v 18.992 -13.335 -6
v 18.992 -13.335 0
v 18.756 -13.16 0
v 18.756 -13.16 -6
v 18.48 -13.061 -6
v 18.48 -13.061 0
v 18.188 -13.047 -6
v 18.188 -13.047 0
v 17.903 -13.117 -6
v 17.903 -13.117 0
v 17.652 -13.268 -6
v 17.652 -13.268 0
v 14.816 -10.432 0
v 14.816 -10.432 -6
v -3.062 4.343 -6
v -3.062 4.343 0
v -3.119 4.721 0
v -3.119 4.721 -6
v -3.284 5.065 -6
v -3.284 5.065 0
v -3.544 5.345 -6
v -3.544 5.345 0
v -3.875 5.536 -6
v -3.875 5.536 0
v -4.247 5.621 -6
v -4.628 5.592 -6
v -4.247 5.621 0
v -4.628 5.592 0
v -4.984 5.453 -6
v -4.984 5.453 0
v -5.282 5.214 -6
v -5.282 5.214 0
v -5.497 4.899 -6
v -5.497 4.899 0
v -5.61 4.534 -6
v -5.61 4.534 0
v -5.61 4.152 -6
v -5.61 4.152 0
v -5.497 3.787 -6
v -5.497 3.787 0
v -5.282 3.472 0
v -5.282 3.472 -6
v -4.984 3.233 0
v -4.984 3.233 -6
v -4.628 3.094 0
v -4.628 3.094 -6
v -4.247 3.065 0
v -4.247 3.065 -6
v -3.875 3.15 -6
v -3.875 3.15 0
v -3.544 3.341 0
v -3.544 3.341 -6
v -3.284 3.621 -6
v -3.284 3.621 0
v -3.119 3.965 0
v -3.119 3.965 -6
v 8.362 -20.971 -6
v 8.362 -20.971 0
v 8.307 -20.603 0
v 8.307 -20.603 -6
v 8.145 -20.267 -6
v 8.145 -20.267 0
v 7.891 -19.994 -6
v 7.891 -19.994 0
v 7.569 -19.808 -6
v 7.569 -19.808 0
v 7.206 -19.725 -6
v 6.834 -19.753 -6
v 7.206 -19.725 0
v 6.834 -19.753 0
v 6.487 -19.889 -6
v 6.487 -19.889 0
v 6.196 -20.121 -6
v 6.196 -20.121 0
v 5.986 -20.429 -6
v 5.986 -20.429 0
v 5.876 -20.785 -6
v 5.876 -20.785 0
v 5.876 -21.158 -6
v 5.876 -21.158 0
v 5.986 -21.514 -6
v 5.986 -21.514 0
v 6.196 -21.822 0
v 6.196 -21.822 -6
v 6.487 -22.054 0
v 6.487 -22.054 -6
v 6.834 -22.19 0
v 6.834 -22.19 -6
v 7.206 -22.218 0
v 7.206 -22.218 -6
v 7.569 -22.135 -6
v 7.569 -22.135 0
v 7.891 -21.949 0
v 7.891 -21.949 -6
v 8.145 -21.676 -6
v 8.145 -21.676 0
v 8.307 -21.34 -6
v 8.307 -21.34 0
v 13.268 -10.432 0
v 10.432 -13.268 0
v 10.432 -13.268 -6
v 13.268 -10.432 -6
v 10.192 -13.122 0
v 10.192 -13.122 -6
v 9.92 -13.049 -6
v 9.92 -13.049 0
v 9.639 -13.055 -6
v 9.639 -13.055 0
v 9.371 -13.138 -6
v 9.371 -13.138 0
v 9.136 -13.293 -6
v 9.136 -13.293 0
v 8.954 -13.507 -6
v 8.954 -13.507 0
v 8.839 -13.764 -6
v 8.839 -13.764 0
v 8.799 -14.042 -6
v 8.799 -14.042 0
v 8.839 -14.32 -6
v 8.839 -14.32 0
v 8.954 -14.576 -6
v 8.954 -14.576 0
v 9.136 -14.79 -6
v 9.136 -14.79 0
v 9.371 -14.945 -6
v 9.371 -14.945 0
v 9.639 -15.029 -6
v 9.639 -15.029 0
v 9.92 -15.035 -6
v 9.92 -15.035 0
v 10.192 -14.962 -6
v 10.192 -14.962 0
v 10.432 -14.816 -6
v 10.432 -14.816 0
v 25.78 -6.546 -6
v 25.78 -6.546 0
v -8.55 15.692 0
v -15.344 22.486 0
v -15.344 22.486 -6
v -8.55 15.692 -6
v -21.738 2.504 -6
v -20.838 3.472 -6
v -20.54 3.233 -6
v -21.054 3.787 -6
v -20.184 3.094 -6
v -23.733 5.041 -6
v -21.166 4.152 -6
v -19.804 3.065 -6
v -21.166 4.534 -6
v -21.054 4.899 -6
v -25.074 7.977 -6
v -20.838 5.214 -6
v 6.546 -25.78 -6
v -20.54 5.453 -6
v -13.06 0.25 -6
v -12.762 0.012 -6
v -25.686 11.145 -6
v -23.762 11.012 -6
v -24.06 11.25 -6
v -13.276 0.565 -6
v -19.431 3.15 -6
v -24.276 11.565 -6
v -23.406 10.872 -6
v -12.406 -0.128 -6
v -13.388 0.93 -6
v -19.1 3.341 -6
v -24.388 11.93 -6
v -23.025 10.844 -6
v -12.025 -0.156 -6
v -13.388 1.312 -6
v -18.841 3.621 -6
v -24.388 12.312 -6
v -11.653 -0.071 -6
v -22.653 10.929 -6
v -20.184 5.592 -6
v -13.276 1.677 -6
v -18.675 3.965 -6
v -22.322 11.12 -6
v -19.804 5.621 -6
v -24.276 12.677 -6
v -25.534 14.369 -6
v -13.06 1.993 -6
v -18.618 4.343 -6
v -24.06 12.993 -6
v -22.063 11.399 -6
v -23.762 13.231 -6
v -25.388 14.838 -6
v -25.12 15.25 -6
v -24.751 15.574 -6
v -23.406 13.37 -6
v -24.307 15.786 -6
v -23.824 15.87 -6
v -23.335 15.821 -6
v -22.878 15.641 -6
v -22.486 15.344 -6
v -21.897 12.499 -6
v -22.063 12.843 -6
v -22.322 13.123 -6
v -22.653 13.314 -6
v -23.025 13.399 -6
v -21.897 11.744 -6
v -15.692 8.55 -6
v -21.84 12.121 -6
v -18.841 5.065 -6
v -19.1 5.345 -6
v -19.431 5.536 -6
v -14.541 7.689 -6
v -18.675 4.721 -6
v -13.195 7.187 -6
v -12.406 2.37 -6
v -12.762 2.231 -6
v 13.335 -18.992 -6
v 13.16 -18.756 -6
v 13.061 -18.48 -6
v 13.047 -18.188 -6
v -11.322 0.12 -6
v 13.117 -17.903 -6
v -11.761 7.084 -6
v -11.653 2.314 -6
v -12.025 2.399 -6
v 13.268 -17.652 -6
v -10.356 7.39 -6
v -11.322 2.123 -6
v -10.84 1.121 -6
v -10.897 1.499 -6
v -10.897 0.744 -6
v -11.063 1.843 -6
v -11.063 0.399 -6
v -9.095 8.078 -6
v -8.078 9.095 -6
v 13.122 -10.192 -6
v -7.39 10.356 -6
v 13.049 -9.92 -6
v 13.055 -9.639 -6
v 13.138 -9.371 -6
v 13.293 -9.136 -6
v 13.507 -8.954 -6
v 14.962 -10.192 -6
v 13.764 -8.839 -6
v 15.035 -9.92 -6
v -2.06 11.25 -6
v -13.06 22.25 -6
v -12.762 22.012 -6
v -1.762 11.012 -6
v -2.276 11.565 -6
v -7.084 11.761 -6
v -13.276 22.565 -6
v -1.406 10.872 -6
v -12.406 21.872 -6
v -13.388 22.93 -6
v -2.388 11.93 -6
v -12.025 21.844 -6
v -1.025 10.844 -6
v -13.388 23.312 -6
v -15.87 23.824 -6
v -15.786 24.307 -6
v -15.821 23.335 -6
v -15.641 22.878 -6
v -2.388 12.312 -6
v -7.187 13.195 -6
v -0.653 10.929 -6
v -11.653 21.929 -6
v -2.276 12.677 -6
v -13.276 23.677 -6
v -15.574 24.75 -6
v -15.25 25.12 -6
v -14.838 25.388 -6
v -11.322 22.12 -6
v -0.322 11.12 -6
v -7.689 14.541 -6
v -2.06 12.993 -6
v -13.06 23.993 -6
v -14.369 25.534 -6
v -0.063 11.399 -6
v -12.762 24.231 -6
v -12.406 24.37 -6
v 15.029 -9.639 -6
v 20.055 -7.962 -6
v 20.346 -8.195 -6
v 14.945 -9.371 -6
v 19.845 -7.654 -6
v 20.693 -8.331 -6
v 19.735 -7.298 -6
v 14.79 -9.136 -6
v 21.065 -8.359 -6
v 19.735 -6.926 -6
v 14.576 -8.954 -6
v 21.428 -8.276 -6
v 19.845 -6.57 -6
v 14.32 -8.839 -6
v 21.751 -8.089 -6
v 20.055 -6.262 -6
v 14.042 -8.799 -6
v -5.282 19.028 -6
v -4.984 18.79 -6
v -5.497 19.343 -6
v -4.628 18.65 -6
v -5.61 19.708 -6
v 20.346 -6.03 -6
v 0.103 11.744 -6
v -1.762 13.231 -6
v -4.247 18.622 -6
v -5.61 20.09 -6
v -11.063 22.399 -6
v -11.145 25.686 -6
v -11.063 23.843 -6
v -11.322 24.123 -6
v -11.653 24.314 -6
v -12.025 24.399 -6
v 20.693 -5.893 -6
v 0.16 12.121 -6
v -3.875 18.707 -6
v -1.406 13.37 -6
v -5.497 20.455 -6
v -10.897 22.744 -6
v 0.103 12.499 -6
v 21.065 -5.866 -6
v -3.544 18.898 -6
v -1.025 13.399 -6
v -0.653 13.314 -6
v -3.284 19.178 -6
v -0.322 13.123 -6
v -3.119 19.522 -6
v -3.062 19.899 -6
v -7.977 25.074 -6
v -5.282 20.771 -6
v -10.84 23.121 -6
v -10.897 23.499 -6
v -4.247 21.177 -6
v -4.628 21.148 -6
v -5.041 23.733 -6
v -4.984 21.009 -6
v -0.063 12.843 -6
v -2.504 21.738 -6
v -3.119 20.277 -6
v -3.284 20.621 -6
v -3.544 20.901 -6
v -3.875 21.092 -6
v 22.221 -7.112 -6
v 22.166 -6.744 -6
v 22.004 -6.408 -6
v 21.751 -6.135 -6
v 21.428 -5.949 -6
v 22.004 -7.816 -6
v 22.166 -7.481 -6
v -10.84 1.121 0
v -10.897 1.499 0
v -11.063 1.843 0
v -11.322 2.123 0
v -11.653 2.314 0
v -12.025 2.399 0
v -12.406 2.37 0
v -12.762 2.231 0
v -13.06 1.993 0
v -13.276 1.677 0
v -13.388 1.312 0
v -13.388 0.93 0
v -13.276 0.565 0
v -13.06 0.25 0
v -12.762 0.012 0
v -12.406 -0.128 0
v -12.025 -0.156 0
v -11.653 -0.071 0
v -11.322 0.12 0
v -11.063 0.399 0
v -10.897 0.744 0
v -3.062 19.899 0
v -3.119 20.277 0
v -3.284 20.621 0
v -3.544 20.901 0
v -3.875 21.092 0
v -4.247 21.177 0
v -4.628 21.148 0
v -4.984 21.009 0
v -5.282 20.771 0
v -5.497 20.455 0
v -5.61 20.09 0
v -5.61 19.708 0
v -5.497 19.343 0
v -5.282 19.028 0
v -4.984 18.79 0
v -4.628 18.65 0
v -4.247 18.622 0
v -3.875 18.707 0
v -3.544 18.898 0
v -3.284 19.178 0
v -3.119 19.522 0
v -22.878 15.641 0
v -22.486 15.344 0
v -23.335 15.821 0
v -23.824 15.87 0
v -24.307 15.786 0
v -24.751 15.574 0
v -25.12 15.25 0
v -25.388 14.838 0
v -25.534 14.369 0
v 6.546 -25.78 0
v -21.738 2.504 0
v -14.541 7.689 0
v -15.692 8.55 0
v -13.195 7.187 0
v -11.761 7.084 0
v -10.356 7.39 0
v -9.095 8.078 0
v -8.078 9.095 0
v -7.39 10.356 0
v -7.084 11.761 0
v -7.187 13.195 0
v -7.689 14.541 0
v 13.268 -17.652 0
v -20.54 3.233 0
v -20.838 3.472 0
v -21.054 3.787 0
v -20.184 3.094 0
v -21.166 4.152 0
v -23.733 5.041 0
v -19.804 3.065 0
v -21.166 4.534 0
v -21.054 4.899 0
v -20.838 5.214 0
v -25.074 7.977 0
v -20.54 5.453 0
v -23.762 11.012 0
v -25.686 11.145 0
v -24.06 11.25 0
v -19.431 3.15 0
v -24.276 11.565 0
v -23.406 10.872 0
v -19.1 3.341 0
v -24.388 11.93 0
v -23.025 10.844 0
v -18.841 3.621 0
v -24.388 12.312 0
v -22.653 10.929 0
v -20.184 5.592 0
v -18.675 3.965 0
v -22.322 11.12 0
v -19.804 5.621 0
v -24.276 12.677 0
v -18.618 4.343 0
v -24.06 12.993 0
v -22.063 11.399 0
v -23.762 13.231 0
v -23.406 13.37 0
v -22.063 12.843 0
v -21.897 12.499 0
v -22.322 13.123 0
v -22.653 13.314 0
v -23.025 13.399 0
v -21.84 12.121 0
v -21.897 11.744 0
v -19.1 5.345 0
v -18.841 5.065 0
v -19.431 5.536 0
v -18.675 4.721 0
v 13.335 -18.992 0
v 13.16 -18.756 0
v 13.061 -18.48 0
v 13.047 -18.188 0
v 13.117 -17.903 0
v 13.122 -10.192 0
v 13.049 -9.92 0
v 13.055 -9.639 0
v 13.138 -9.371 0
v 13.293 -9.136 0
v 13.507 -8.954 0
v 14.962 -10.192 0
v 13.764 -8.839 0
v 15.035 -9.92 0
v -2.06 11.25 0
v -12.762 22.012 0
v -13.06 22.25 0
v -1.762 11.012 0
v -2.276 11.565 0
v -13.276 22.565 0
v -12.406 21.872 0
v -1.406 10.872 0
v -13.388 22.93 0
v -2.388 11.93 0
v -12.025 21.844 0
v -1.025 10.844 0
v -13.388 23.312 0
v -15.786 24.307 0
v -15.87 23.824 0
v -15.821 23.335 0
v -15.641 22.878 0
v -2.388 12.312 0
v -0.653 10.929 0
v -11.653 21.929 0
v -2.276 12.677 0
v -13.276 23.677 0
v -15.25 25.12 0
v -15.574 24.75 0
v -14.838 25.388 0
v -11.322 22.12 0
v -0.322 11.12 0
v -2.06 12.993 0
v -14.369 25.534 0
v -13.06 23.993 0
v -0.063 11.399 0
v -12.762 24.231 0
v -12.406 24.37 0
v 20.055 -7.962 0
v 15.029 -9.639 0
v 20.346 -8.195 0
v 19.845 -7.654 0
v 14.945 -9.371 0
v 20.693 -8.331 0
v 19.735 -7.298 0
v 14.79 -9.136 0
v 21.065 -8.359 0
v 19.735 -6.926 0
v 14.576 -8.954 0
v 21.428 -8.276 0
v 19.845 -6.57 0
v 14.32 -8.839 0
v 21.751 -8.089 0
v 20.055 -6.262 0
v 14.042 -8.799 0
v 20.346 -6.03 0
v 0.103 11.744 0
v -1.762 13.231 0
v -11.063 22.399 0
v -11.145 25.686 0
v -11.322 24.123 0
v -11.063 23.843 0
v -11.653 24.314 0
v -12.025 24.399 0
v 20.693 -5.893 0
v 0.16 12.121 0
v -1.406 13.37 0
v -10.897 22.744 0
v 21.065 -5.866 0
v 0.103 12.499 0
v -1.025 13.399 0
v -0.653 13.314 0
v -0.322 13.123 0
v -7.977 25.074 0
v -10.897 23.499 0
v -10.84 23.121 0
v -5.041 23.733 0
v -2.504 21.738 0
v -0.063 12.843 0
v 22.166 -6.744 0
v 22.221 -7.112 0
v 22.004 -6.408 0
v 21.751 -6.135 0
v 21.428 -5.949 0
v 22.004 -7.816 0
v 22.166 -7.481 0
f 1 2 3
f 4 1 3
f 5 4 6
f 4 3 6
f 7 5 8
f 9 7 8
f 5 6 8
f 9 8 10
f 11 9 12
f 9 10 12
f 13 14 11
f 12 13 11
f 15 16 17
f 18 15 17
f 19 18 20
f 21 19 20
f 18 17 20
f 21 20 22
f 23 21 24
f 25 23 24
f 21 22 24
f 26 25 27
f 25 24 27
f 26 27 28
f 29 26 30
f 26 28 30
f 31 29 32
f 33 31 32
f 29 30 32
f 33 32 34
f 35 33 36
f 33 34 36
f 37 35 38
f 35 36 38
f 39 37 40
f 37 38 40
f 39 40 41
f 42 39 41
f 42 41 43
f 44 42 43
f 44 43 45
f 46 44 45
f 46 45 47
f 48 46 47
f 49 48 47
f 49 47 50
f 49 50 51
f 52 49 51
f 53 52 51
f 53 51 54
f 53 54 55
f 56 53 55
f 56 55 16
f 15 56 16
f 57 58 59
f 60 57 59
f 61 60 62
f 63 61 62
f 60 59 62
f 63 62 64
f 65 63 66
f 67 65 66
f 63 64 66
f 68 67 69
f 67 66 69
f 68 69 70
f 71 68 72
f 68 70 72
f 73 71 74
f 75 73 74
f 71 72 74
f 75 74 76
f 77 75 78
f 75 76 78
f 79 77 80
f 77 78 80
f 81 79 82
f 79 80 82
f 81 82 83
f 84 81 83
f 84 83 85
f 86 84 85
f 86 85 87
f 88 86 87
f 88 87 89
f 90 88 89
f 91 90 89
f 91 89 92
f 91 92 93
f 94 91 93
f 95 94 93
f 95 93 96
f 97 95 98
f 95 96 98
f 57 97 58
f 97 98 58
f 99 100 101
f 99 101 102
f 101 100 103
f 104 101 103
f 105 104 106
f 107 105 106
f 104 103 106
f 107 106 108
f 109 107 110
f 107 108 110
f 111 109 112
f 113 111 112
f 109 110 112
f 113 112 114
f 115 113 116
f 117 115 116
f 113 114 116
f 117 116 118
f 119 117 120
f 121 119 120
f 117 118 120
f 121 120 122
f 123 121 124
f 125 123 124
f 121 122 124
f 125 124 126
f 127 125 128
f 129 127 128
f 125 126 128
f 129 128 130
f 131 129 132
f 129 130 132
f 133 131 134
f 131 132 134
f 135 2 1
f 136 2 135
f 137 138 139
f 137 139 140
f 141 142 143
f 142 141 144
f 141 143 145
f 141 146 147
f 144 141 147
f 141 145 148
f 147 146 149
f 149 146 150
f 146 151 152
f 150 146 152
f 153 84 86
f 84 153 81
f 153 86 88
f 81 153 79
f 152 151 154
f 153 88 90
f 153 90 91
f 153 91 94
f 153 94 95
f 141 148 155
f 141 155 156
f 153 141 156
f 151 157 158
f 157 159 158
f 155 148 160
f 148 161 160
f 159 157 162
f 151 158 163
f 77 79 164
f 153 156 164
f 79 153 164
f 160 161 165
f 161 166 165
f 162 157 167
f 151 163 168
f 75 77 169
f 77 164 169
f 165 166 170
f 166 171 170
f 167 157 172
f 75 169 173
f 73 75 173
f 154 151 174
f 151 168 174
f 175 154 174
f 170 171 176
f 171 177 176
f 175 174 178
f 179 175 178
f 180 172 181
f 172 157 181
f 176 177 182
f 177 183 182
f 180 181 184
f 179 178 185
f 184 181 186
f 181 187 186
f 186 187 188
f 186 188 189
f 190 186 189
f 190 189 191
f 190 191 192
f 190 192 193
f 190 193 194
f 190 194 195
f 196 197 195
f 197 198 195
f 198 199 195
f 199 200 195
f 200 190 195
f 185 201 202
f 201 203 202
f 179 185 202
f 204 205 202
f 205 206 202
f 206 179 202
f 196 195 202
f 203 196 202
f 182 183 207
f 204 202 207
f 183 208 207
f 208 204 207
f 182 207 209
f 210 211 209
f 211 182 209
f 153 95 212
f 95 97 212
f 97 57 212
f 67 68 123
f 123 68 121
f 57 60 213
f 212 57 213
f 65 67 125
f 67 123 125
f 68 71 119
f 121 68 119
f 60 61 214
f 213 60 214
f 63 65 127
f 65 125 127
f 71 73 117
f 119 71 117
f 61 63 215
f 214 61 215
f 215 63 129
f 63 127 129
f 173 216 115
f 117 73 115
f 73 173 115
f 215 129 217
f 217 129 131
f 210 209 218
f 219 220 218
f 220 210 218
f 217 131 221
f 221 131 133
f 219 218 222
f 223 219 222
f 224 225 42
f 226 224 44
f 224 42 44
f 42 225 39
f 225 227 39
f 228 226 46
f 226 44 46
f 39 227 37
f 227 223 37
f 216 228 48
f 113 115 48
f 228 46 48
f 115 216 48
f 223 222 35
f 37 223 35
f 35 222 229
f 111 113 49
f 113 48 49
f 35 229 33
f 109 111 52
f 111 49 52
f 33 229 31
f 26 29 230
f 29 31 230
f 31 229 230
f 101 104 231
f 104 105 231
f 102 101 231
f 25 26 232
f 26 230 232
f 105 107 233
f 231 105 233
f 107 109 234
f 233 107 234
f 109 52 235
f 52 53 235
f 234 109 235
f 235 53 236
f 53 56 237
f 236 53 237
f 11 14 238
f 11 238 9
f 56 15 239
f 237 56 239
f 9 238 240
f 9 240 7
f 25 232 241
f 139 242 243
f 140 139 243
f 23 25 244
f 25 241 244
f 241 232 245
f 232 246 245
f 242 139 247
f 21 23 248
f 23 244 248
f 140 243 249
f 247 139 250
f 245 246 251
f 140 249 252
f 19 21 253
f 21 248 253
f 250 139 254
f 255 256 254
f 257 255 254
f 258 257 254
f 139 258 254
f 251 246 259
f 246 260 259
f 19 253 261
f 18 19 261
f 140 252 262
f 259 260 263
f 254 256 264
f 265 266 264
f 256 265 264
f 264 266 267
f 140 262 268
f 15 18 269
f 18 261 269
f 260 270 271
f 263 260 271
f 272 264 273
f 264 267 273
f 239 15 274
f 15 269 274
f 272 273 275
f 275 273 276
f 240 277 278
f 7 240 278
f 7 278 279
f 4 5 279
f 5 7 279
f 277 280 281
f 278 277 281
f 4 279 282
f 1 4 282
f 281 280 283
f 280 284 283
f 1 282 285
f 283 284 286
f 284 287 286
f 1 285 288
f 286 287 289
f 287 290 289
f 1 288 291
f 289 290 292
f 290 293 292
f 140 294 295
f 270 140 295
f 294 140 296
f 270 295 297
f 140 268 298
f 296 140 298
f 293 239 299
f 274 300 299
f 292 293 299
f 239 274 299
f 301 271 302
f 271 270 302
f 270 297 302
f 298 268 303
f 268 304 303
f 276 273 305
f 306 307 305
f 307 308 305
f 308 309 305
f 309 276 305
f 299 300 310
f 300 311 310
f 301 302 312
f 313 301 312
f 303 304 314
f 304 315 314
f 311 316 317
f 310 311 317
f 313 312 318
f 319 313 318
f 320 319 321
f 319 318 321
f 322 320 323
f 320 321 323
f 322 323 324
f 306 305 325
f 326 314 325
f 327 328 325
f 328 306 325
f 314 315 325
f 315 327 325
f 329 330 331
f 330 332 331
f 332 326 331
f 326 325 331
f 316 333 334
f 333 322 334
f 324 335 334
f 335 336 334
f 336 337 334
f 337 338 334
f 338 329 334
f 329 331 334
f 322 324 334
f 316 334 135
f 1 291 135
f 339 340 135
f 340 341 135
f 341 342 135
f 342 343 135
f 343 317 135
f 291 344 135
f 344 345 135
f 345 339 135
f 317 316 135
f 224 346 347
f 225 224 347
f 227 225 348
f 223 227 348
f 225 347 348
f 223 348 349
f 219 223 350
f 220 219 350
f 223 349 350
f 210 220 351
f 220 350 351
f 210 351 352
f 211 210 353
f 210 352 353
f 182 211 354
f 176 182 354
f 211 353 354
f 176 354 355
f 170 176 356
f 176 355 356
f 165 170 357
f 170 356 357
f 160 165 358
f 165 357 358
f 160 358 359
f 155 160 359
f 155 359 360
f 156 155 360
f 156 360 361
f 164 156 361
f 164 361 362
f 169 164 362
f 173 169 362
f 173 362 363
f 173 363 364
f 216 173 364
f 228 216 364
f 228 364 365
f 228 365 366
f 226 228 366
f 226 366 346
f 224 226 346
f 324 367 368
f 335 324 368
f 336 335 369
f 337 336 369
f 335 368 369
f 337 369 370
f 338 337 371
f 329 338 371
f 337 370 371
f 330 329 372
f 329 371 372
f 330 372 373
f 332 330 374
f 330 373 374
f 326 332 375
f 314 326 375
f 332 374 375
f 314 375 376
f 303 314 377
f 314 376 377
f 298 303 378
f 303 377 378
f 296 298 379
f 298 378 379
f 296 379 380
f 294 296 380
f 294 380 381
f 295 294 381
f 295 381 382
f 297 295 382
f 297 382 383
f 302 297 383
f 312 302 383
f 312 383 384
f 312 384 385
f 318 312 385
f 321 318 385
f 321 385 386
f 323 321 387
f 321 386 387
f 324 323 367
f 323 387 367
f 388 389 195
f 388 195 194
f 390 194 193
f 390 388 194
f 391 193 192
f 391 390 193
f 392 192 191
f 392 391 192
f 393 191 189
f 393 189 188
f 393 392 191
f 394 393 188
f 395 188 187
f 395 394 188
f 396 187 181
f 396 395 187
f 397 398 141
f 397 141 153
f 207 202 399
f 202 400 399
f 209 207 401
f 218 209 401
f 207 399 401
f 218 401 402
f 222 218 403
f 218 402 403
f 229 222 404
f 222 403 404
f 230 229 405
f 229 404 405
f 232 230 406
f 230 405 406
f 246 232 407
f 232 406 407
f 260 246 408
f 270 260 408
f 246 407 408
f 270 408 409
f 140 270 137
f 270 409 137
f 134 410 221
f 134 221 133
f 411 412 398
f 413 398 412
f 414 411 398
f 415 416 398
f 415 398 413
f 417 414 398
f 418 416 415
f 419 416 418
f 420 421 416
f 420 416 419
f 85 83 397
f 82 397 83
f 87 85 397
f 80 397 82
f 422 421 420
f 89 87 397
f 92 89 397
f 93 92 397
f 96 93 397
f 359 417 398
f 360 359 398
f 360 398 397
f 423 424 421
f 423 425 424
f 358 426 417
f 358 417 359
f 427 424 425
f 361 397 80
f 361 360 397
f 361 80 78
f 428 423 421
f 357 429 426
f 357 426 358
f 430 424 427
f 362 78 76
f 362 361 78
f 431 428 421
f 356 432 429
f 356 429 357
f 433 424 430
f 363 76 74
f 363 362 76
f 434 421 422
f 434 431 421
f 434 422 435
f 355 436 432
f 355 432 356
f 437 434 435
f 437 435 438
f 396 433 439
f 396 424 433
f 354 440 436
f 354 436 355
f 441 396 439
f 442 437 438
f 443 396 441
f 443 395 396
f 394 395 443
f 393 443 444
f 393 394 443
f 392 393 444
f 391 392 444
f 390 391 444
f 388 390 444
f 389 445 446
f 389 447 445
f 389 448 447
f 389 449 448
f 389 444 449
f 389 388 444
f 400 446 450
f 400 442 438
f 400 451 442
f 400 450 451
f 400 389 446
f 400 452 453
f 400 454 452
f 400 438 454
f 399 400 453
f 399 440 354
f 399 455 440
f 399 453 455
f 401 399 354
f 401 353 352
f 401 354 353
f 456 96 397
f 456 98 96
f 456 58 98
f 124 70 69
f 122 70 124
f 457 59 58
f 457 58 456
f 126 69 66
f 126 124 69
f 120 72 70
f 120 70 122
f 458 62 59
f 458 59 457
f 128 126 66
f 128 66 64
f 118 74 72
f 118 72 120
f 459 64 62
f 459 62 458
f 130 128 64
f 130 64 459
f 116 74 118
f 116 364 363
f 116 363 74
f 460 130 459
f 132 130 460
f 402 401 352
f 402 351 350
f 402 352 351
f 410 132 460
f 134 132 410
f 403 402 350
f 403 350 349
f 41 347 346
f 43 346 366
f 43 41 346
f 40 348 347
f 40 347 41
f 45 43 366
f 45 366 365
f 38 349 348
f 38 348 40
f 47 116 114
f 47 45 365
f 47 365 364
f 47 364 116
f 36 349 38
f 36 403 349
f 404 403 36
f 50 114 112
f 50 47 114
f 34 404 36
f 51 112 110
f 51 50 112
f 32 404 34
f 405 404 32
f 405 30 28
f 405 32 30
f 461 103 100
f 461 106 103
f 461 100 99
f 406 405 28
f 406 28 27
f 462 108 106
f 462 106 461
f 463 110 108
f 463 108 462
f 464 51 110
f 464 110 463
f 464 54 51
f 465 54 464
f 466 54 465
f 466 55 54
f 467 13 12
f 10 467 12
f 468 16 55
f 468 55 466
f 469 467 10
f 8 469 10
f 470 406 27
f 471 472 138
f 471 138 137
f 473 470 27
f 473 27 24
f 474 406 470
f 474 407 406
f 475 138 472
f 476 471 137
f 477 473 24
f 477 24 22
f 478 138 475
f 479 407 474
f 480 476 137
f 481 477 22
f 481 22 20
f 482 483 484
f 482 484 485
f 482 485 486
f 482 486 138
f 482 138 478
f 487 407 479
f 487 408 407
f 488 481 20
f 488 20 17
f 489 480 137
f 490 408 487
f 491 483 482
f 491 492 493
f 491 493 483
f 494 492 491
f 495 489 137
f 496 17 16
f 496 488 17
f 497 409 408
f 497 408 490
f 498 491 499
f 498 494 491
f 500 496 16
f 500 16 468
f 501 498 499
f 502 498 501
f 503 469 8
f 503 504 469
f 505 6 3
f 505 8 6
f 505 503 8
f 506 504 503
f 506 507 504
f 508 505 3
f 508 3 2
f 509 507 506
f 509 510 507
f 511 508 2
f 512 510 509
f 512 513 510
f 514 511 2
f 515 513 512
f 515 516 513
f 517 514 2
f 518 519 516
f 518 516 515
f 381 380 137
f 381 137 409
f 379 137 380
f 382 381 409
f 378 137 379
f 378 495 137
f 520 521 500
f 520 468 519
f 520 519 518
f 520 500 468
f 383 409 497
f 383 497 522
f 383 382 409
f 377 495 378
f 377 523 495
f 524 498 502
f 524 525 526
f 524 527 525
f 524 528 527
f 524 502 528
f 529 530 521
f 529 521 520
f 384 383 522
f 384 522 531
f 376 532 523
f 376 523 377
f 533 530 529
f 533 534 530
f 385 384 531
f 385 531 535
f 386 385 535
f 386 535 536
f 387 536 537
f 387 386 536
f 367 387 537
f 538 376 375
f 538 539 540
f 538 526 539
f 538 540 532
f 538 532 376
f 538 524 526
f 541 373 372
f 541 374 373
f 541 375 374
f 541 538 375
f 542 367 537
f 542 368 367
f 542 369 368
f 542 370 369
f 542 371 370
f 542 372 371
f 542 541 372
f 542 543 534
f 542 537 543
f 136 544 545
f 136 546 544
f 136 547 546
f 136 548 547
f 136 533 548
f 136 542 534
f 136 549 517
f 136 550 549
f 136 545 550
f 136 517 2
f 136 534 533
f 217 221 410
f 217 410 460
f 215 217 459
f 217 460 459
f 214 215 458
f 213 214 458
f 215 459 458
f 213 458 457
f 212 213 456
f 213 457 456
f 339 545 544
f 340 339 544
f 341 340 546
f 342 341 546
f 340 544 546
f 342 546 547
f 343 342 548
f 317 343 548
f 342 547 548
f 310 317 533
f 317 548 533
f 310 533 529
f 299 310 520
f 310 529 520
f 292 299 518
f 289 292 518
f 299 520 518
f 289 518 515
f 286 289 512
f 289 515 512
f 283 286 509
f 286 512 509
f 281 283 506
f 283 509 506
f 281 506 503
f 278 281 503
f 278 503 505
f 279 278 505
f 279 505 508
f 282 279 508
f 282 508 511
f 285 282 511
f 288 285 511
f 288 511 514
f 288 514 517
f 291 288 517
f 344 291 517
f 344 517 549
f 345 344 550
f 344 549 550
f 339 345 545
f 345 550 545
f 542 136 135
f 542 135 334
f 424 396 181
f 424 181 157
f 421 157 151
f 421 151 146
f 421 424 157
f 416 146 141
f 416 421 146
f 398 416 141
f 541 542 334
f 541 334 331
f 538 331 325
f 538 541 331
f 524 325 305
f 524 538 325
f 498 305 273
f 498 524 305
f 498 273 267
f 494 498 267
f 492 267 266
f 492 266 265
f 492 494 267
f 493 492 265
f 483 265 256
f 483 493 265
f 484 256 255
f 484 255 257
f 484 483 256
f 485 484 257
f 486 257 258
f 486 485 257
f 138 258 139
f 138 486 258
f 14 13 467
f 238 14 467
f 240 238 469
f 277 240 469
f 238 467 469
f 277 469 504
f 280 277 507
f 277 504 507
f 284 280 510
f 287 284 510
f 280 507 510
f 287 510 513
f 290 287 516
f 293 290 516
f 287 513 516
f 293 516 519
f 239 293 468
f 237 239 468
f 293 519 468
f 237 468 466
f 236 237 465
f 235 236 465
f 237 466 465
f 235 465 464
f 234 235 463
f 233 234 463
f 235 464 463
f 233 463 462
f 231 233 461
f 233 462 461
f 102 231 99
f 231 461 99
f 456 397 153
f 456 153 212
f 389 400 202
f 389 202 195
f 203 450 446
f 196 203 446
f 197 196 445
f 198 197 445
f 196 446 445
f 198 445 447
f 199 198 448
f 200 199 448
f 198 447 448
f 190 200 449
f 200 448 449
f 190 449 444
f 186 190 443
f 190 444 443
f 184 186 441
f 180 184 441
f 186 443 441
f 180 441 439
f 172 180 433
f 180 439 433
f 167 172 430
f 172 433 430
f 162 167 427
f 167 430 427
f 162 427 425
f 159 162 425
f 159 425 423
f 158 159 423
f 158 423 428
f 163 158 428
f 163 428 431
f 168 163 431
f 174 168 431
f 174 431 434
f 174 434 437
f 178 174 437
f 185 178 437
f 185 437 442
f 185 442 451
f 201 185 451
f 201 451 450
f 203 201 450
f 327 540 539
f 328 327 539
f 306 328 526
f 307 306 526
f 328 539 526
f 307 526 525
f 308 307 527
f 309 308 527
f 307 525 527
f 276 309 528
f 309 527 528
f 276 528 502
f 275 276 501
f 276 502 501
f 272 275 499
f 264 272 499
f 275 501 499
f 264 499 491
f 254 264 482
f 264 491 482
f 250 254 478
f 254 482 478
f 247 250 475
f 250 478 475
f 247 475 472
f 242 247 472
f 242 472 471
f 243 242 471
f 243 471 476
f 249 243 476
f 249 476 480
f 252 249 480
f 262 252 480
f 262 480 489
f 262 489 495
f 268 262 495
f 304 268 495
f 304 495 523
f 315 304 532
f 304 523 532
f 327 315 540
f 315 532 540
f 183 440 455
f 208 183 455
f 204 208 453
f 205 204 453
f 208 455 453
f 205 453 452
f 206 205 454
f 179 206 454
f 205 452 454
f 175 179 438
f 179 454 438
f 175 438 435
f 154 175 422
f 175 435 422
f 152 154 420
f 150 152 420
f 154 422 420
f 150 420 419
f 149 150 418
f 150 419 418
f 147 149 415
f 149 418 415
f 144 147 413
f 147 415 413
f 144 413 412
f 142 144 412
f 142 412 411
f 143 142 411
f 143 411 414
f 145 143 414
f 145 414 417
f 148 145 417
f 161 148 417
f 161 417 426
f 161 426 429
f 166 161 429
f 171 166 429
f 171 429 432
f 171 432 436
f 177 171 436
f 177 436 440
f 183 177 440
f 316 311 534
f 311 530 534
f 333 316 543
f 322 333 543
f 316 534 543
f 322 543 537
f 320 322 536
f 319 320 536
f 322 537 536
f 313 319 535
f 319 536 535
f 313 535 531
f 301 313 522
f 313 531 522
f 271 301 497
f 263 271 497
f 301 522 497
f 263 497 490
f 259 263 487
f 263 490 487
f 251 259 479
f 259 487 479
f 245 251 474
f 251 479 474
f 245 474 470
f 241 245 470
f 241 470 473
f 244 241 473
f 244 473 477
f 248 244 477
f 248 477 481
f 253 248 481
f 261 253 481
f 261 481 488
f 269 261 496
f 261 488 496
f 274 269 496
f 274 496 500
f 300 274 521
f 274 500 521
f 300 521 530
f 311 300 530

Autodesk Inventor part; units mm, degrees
ref_plane "YZ Plane" through (0, 0, 0) normal (1, 0, 0) x (0, 1, 0)
ref_plane "XZ Plane" through (0, 0, 0) normal (0, 1, 0) x (-1, 0, 0)
ref_plane "XY Plane" through (0, 0, 0) normal (0, 0, 1) x (1, 0, 0)
sketch "스케치1" plane through (0, 0, 0) normal (0, 0, 1) x (1, 0, 0)
  line L0 (25.7798, -6.5464) -> (-2.5045, 21.7378) projected
  arc A0 (-2.5045, 21.7378) -> (-14.369, 25.5341) centre (-12.1212, 12.1212) ccw projected
  arc A1 (-14.369, 25.5341) -> (-15.3443, 22.4861) centre (-14.0715, 23.7589) ccw projected
  line L1 (-15.3443, 22.4861) -> (-8.5503, 15.6921) projected
  arc A2 (-15.6921, 8.5503) -> (-8.5503, 15.6921) centre (-12.1212, 12.1212) ccw projected
  line L2 (-15.6921, 8.5503) -> (-22.4861, 15.3443) projected
  arc A3 (-22.4861, 15.3443) -> (-25.5341, 14.369) centre (-23.7589, 14.0715) ccw projected
  arc A4 (-25.5341, 14.369) -> (-21.7378, 2.5045) centre (-12.1212, 12.1212) ccw projected
  line L3 (-21.7378, 2.5045) -> (6.5464, -25.7798) projected
  line L4 (6.5464, -25.7798) -> (13.3347, -18.9915) projected
  arc A5 (13.2675, -17.6516) -> (13.3347, -18.9915) centre (14.0418, -18.2844) ccw projected
  line L5 (13.2675, -17.6516) -> (10.432, -14.8161) projected
  arc A6 (10.432, -13.2675) -> (10.432, -14.8161) centre (9.7991, -14.0418) ccw projected
  line L6 (10.432, -13.2675) -> (13.2675, -10.432) projected
  arc A7 (14.8161, -10.432) -> (13.2675, -10.432) centre (14.0418, -9.7991) ccw projected
  line L7 (14.8161, -10.432) -> (17.6516, -13.2675) projected
  arc A8 (18.9915, -13.3347) -> (17.6516, -13.2675) centre (18.2844, -14.0418) ccw projected
  line L8 (18.9915, -13.3347) -> (25.7798, -6.5464) projected
  circle A9 centre (20.9714, -7.1121) radius 1.25 projected
  circle A10 centre (-19.8993, 4.343) radius 1.2812 projected
  circle A11 centre (-23.1212, 12.1212) radius 1.2812 projected
  circle A12 centre (-4.343, 4.343) radius 1.2812 projected
  circle A13 centre (-1.1212, 12.1212) radius 1.2812 projected
  circle A14 centre (-12.1212, 1.1212) radius 1.2812 projected
  circle A15 centre (-4.343, 19.8993) radius 1.2812 projected
  circle A16 centre (-12.1212, 23.1212) radius 1.2812 projected
  circle A17 centre (7.1121, -20.9714) radius 1.25 projected
  line L9 (10.432, -14.8161) -> (13.2675, -17.6516)
  line L10 (14.8161, -10.432) -> (17.6516, -13.2675)
  point P0 (0, 0)
extrude "돌출1" add sketch "스케치1" against normal blind 6
properties part number "ankle" material "PMMA 플라스틱"
